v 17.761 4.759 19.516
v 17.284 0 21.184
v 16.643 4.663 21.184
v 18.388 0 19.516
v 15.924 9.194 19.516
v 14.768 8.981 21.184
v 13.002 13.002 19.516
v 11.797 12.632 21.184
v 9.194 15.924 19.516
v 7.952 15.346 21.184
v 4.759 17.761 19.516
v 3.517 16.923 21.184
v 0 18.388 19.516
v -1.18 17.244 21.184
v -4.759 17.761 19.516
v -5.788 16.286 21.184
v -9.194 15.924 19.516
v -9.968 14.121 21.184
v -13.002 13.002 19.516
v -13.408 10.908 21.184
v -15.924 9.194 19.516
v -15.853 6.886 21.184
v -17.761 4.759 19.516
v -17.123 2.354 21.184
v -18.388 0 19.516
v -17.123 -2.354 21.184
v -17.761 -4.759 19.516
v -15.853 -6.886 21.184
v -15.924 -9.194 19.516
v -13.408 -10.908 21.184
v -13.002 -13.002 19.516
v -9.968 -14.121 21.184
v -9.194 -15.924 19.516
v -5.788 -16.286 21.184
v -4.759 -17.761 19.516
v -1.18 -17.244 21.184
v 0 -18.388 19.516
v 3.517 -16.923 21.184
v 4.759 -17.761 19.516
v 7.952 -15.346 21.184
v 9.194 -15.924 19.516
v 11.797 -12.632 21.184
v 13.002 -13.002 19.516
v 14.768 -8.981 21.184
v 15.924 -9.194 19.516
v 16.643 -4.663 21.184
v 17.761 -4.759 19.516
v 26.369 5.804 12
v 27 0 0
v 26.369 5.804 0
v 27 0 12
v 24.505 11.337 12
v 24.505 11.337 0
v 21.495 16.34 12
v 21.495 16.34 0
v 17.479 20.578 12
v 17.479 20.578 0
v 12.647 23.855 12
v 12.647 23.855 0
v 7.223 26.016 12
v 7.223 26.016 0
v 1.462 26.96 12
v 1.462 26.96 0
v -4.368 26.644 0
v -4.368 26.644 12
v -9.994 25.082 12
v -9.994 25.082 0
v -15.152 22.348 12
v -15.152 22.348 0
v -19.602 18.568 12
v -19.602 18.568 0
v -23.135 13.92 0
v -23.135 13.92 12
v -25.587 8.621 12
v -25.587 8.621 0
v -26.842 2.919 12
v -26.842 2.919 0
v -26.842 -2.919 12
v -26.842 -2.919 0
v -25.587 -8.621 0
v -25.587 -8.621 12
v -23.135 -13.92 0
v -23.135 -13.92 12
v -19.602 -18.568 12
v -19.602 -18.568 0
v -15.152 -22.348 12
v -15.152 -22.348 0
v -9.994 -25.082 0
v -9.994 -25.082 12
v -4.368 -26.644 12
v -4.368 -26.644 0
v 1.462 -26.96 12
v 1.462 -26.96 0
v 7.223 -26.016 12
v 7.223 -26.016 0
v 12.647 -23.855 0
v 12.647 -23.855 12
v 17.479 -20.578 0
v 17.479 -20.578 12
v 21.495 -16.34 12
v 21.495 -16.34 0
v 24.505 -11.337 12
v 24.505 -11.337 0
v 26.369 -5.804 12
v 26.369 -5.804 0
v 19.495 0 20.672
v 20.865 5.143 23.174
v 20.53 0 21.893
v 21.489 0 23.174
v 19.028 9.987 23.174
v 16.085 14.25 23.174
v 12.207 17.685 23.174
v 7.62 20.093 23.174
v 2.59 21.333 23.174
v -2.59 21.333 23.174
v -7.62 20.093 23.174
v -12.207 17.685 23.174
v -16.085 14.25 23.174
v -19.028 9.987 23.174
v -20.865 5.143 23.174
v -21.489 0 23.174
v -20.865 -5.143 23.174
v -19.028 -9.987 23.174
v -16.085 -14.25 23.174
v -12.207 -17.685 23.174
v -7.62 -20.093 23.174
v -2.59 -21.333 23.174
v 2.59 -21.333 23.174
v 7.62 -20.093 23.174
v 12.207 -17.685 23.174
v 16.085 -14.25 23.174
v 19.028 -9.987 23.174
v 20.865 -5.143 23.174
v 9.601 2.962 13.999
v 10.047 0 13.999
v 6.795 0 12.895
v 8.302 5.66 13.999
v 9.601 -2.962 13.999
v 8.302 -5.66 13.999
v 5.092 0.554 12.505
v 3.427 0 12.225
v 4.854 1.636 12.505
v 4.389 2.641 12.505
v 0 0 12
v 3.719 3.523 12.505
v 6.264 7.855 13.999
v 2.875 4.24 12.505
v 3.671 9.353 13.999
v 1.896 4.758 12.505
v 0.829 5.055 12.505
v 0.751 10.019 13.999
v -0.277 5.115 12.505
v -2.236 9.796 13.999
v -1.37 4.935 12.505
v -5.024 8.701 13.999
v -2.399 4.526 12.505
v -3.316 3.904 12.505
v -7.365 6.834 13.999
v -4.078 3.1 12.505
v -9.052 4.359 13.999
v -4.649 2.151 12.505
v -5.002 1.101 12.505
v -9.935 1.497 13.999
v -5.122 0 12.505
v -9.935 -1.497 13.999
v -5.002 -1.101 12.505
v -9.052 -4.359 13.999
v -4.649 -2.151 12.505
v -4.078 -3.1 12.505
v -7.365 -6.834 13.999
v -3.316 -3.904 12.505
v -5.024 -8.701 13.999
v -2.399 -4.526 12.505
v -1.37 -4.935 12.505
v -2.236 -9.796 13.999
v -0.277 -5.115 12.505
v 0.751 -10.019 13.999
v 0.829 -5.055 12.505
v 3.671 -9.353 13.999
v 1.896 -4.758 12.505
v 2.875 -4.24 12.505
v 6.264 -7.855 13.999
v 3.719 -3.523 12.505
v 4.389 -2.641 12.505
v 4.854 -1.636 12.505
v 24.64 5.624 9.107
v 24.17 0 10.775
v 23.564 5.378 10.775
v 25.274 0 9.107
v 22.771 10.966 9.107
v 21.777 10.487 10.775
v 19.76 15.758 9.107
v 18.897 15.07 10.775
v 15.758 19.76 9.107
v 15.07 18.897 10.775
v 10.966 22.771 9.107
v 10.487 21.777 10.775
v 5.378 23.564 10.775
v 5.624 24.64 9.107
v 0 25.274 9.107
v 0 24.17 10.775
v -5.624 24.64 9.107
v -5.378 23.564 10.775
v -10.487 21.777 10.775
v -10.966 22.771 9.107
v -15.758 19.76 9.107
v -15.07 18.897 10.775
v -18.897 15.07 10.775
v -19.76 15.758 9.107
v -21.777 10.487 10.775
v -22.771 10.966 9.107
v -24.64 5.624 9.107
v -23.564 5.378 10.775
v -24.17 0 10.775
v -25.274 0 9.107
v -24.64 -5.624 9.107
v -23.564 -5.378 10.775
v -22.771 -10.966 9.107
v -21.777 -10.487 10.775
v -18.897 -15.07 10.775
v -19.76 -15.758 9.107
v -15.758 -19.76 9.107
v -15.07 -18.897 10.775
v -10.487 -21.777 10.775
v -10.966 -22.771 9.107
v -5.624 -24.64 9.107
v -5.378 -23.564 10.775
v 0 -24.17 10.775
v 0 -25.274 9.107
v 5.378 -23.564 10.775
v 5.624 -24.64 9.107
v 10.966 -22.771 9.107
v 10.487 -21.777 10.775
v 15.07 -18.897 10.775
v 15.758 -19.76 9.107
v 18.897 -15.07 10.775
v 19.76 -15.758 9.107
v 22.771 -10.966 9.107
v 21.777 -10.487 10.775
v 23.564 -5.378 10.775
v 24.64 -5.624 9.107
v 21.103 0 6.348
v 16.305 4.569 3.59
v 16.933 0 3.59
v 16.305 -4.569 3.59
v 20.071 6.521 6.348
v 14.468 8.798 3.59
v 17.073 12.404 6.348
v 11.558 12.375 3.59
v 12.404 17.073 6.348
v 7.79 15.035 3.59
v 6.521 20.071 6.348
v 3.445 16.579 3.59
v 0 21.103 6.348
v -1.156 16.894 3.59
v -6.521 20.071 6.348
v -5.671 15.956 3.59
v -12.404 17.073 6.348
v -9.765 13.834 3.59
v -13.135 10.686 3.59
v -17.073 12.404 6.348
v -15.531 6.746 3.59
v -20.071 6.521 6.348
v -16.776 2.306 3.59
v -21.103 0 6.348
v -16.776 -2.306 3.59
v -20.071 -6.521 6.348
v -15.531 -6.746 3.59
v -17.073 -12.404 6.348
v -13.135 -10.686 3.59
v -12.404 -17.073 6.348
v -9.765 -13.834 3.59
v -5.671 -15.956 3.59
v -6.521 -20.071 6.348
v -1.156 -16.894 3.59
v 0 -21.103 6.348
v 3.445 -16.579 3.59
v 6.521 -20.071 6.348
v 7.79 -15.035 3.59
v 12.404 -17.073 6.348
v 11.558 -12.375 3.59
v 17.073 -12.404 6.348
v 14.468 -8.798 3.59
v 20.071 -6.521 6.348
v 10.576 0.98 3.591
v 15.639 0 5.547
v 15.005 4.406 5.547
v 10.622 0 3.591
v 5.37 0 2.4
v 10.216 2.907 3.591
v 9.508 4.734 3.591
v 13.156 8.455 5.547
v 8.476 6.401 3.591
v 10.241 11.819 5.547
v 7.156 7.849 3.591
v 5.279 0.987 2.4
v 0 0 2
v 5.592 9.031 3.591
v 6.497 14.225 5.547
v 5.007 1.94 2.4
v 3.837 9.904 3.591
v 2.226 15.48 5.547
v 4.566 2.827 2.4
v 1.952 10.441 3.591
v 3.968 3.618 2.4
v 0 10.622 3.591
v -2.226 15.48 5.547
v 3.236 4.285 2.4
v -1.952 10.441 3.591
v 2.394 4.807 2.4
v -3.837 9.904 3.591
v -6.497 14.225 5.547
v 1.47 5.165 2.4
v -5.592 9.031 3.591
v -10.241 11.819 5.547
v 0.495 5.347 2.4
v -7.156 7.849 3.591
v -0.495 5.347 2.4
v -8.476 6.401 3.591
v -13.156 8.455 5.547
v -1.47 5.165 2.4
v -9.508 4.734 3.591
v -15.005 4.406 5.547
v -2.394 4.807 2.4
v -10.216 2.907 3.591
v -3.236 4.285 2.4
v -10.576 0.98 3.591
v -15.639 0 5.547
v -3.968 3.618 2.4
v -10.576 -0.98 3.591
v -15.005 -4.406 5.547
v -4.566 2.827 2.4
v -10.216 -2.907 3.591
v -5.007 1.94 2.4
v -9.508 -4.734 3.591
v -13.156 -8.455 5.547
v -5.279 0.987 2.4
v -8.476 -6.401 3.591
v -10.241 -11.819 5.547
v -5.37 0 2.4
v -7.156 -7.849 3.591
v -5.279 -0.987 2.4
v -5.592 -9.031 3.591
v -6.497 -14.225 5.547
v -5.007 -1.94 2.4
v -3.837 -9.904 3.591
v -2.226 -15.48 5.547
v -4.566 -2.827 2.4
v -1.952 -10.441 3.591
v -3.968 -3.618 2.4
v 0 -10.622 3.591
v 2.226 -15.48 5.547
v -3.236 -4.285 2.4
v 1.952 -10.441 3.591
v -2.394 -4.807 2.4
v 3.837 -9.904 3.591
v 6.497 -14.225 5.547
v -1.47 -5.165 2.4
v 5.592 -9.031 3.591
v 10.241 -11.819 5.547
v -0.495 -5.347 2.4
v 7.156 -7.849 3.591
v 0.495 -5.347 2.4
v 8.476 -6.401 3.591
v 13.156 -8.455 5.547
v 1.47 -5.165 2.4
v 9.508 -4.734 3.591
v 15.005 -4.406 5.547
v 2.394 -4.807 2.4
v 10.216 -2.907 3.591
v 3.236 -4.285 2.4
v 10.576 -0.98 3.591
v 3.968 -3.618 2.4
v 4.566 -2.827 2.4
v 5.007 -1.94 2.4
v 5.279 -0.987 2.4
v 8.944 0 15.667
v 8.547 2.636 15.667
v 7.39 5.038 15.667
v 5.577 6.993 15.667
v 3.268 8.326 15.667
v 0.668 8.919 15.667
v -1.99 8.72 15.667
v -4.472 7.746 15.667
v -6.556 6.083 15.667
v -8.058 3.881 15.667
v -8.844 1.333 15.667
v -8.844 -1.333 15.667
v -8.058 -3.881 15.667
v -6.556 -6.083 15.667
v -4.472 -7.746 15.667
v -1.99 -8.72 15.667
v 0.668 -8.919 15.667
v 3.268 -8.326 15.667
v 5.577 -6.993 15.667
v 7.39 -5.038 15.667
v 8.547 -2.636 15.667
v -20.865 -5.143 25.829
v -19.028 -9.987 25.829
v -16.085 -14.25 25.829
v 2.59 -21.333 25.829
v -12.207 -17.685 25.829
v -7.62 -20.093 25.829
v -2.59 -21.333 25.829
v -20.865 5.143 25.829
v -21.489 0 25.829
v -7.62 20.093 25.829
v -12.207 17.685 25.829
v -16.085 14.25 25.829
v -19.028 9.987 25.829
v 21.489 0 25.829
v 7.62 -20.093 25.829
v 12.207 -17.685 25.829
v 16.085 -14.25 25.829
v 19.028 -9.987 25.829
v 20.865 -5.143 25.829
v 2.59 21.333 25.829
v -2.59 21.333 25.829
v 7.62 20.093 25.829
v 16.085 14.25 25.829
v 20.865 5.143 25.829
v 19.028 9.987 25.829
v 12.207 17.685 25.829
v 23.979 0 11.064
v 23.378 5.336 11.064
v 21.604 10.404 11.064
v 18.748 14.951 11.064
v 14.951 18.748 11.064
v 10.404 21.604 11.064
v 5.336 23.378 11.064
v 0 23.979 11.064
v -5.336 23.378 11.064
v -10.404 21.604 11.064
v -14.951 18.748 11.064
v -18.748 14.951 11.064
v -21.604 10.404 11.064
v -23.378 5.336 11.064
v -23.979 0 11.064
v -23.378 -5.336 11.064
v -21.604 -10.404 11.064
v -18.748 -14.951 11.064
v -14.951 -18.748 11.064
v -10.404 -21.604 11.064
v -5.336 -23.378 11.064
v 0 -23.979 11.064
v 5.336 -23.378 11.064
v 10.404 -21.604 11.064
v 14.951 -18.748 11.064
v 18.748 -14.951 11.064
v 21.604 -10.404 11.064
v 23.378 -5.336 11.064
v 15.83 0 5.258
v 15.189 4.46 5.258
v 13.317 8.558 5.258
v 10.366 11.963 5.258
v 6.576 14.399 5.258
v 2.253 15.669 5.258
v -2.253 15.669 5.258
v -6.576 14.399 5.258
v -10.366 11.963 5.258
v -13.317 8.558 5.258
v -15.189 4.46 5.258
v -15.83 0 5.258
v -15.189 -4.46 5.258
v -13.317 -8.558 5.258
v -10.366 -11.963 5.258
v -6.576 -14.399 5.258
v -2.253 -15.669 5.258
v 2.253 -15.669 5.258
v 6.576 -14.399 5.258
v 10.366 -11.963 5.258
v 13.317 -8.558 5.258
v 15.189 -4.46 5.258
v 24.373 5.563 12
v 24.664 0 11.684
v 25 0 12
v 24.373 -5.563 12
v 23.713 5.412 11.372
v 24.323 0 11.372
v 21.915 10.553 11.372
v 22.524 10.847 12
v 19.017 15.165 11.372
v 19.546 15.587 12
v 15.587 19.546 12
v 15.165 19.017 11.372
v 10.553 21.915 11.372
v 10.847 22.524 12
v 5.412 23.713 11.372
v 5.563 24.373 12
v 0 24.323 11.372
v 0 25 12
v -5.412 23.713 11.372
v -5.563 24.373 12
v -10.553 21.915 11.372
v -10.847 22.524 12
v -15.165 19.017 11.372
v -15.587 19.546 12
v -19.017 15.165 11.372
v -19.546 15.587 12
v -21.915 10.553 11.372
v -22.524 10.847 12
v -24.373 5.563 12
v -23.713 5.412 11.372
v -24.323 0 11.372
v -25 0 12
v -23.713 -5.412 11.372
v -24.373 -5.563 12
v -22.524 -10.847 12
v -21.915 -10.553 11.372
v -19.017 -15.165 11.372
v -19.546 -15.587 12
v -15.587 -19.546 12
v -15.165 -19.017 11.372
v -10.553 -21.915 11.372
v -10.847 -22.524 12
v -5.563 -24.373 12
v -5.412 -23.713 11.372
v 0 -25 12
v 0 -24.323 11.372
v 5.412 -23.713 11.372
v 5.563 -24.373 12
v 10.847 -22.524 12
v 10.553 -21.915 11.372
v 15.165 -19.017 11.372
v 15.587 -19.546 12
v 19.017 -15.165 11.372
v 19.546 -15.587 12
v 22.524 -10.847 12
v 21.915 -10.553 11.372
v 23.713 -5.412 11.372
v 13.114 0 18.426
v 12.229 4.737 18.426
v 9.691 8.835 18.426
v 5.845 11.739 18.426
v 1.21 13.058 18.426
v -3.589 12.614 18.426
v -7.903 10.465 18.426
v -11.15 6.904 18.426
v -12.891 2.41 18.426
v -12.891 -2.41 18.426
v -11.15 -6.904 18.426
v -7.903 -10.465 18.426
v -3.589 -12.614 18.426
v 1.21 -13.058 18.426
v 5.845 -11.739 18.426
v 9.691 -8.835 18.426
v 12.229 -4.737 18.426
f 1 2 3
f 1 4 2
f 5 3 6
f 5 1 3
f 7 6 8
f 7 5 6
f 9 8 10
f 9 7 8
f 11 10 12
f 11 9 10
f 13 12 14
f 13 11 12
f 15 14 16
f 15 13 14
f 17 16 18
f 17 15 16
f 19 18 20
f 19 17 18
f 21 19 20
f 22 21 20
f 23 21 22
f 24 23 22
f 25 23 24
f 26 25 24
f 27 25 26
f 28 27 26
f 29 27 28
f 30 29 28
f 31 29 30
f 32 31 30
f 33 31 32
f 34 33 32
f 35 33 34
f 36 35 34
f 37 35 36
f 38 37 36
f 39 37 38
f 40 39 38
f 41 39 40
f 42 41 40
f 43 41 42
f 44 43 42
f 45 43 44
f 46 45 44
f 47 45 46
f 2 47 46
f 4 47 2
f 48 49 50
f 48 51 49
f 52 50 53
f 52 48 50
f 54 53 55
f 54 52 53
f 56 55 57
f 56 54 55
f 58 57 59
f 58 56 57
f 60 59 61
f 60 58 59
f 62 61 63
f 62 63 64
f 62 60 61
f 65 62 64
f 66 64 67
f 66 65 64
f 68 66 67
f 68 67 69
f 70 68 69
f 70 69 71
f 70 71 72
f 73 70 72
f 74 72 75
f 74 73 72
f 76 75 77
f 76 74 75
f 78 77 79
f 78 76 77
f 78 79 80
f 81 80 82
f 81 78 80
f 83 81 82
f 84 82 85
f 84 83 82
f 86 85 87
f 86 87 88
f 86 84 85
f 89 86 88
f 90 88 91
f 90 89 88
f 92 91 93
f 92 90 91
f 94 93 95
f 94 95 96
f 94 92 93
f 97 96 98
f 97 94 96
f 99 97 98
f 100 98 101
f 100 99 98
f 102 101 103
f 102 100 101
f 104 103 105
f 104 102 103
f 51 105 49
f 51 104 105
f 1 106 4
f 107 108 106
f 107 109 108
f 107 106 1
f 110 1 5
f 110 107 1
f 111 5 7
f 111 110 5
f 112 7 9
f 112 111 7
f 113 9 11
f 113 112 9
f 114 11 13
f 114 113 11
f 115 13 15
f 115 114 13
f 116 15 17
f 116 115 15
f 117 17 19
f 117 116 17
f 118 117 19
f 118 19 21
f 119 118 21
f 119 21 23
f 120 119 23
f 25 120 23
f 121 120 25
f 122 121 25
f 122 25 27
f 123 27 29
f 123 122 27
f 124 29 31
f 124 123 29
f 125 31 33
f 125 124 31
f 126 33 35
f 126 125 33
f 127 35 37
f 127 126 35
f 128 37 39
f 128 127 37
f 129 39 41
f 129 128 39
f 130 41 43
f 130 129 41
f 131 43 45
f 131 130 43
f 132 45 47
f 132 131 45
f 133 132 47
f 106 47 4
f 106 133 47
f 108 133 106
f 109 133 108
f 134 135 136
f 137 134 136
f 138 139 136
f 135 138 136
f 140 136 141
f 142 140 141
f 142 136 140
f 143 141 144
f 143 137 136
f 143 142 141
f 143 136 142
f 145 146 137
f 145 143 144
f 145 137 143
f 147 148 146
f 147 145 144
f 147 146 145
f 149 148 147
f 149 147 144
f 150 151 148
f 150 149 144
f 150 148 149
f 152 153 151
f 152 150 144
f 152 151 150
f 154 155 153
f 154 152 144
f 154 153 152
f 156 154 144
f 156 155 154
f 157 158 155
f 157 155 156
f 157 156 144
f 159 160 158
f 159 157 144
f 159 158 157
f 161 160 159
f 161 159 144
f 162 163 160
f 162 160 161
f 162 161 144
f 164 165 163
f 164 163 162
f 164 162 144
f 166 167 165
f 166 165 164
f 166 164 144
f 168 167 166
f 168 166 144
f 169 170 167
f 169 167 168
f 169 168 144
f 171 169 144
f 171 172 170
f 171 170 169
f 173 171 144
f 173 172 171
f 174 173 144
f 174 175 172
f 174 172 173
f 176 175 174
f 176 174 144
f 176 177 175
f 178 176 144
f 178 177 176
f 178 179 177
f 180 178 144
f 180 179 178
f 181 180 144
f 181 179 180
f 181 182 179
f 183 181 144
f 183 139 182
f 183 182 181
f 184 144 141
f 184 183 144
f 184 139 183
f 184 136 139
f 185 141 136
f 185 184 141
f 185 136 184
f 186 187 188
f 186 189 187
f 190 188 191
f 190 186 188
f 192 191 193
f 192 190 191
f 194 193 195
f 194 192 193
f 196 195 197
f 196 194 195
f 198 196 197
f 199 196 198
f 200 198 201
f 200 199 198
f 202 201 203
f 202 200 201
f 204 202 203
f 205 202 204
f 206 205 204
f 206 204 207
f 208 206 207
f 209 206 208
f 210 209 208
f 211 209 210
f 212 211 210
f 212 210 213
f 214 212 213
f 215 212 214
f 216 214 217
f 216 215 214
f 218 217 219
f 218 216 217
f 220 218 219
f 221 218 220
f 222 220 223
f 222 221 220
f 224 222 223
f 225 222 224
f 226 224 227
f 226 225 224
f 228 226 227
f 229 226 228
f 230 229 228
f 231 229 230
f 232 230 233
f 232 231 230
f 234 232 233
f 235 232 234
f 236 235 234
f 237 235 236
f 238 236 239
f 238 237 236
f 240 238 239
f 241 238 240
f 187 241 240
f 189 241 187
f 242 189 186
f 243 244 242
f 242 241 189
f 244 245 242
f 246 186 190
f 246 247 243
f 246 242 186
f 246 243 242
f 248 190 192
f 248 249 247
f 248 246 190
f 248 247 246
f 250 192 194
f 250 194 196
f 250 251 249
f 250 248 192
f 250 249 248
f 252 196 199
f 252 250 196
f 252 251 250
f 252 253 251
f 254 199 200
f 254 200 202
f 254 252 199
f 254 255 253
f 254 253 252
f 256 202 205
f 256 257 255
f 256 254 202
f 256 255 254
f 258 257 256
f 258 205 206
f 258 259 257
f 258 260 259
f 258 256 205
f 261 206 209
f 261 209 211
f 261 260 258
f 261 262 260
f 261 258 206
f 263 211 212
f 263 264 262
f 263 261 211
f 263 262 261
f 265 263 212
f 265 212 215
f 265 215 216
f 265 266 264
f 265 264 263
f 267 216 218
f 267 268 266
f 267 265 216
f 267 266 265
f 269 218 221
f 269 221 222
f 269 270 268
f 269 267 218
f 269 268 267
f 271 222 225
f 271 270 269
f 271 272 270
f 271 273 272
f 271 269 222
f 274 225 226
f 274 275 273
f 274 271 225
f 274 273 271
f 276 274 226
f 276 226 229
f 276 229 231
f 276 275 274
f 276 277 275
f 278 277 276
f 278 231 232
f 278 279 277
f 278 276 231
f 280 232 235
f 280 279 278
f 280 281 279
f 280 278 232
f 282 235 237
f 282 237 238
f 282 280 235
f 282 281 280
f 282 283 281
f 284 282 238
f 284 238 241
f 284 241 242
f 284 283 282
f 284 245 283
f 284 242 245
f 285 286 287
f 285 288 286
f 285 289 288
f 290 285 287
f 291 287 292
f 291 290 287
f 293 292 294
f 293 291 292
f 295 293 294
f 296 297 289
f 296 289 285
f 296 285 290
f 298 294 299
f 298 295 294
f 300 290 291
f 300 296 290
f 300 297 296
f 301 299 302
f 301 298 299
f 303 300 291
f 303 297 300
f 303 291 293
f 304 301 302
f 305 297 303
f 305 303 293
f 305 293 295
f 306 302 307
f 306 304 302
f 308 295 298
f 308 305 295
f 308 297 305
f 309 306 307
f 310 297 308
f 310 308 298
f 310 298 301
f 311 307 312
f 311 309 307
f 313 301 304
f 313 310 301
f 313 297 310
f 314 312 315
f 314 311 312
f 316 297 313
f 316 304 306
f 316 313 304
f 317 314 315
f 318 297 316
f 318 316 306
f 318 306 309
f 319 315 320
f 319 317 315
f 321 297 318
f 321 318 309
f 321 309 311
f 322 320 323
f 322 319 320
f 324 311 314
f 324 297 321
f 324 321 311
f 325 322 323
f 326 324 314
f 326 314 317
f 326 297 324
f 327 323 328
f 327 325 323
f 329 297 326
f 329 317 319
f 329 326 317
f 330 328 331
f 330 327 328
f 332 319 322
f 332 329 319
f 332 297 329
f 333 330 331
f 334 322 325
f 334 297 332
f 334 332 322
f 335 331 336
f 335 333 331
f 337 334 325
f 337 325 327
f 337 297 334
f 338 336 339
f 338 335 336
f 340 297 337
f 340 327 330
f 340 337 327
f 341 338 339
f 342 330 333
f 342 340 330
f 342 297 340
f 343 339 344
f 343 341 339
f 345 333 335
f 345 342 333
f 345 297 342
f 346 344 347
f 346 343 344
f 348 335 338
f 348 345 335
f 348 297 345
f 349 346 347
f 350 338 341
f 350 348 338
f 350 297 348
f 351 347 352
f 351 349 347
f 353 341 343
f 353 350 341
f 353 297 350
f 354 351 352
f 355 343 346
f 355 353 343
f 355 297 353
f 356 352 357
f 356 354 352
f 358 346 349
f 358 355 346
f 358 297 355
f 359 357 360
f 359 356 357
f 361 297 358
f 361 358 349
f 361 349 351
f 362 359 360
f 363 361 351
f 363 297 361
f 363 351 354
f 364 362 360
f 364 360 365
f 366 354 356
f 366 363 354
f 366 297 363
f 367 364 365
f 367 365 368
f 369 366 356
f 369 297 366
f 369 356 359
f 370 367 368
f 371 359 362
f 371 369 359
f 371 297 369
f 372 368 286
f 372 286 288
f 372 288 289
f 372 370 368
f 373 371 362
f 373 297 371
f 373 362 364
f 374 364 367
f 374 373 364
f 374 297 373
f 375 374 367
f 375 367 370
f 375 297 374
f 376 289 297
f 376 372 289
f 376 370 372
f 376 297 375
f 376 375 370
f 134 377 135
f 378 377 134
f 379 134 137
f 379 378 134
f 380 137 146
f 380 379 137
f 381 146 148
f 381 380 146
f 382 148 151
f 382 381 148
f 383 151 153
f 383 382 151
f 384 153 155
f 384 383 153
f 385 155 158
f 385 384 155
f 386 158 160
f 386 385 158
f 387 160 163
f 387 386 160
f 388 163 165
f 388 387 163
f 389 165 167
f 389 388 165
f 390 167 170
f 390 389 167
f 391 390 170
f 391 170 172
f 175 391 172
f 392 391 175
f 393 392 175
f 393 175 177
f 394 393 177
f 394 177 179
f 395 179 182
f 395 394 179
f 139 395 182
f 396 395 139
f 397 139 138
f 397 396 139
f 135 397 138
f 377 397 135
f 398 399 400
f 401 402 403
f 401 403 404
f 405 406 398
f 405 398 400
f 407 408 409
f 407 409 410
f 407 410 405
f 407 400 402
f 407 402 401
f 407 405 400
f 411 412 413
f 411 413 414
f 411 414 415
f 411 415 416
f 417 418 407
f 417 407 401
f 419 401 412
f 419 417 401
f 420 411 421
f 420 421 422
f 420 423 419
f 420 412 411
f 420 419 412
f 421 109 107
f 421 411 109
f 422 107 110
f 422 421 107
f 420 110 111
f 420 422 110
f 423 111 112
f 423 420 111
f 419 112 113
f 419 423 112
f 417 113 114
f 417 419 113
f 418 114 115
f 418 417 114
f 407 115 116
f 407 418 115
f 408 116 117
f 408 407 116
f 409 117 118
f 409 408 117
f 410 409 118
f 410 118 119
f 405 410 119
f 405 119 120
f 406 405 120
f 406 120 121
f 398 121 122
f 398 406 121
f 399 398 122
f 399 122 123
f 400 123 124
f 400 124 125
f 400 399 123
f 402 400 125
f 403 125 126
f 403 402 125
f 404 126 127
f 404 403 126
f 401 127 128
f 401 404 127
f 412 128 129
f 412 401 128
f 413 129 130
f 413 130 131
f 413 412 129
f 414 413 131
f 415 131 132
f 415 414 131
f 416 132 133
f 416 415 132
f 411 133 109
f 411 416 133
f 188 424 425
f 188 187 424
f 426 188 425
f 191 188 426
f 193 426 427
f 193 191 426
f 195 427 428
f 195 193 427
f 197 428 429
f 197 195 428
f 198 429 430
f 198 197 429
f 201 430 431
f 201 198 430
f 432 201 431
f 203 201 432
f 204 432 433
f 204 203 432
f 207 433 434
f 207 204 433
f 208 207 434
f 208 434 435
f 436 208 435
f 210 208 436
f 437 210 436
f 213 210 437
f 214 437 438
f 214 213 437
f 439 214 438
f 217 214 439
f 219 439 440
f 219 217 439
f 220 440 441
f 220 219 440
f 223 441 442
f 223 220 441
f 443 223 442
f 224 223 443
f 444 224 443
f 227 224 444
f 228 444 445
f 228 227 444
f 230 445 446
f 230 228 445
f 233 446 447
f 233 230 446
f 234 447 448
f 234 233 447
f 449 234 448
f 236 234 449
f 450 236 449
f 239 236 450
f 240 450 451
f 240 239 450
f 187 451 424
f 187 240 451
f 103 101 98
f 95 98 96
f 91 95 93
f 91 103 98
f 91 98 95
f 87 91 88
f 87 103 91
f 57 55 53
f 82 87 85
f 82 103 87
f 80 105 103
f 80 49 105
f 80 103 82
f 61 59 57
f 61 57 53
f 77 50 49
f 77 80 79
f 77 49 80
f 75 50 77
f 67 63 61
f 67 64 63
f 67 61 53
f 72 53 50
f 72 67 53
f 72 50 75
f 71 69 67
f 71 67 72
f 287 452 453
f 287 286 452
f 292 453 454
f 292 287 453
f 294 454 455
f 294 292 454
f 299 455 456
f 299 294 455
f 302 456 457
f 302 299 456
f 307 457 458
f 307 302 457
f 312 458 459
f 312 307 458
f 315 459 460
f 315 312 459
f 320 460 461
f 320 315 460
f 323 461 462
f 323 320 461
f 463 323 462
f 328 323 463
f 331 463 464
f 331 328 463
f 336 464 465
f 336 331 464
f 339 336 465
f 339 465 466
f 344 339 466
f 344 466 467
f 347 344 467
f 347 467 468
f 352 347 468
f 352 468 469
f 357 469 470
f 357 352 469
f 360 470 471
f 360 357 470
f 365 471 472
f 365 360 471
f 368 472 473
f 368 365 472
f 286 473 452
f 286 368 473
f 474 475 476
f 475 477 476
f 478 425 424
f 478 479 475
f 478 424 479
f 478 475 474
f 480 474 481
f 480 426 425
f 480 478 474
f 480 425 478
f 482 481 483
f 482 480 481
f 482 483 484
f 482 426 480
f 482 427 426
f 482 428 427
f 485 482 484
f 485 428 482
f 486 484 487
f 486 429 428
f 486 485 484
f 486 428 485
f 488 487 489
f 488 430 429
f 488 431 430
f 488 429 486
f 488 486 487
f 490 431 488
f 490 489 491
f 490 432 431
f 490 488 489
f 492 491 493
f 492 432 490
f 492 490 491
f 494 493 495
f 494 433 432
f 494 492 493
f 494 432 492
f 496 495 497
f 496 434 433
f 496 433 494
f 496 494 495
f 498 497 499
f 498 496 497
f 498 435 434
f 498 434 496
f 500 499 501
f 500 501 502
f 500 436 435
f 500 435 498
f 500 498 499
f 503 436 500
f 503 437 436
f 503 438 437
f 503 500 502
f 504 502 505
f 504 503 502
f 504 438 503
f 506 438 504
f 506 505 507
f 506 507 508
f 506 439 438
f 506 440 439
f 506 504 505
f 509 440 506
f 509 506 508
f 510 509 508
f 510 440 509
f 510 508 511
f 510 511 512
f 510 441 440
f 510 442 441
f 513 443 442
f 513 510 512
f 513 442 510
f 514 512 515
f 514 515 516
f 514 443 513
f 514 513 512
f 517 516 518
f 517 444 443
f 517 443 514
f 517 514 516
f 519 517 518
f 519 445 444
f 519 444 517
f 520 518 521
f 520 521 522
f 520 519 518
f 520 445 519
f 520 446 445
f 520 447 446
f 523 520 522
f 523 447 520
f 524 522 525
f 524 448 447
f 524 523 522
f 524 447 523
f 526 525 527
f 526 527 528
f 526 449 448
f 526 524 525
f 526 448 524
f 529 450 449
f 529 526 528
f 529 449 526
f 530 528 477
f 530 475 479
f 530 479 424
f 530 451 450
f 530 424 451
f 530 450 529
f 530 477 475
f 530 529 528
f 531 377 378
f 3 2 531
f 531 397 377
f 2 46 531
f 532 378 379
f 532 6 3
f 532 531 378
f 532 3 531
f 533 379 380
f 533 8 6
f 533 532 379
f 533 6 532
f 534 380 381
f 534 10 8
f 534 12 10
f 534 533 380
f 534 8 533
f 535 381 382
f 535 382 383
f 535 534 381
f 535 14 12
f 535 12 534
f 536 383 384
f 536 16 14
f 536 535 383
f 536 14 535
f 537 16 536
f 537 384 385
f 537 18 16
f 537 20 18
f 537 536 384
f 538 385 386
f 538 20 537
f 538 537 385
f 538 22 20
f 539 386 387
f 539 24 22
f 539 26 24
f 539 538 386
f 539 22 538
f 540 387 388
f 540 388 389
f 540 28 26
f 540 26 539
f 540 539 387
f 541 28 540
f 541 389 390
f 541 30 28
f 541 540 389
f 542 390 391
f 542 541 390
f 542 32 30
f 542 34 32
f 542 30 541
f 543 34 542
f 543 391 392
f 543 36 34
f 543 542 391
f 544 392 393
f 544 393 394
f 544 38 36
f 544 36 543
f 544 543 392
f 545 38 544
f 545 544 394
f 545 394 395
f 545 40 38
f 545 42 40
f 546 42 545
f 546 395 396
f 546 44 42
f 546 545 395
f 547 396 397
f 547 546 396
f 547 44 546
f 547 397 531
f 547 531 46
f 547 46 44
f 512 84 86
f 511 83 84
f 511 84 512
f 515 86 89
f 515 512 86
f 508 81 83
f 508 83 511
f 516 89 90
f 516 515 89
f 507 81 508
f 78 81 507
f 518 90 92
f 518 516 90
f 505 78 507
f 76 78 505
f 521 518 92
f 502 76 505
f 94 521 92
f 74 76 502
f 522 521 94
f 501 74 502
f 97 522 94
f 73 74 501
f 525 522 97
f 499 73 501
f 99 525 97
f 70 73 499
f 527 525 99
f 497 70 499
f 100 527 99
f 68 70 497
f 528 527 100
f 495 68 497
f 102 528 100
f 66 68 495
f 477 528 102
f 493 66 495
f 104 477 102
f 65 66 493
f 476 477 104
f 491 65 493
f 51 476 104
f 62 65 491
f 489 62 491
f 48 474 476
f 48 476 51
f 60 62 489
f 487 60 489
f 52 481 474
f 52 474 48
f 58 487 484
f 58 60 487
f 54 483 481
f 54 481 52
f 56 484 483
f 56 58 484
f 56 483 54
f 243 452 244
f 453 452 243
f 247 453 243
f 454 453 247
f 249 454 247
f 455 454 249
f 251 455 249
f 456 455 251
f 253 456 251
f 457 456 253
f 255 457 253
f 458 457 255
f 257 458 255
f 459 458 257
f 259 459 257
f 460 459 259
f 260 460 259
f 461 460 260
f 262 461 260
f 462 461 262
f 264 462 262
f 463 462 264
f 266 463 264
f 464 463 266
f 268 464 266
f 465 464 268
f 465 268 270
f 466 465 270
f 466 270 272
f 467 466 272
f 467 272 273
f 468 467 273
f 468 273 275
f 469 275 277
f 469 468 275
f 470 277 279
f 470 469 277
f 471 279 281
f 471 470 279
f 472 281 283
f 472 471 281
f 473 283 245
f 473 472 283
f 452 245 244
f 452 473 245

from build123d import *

# Parameters (mm, degrees)
F1_R     = 5
F2_DEPTH = 2


with BuildPart() as f2:
    # F1 (on Top) → F2 (new body)
    with BuildSketch(Plane.XY):
        Circle(F1_R)
    extrude(amount=F2_DEPTH)

    # F3 (on Front) → F4 (revolve)
    with BuildSketch(Plane.XZ):
        with BuildLine():
            Line((0, 2), (0, 0))
            Line((0, 0), (25, 0))
            Line((25, 0), (27, 0))
            Line((27, 0), (27, 12))
            Line((27, 12), (25, 12))
            ThreePointArc((25, 12), (24.4939551563, 11.5271883815), (23.9789700303, 11.064130577))
            Line((23.9789700303, 11.064130577), (24.1701333181, 10.7751541335))
            Line((24.1701333181, 10.7751541335), (25.2735815939, 9.1071008063))
            Line((25.2735815939, 9.1071008063), (16.9333149578, 3.589859427))
            Line((16.9333149578, 3.589859427), (15.8298666819, 5.2579127542))
            Line((15.8298666819, 5.2579127542), (15.6387033941, 5.5468891976))
            ThreePointArc((15.6387033941, 5.5468891976), (8.0179403033, 2.8978411792), (0, 2))
        make_face()
    revolve(axis=Axis((0, 0, 1), (0, 0, 1)))


with BuildPart() as f4:
    # F3 (on Front) → F4, piece 2 (revolve)
    with BuildSketch(Plane.XZ):
        with BuildLine():
            Line((0, 25.8287321776), (0, 12))
            ThreePointArc((0, 12), (5.1221996467, 12.5046009784), (10.0474722875, 13.9990041311))
            Line((10.0474722875, 13.9990041311), (8.9440240116, 15.6670574584))
            Line((8.9440240116, 15.6670574584), (17.2842906478, 21.1842988377))
            Line((17.2842906478, 21.1842988377), (18.3877389237, 19.5162455104))
            ThreePointArc((18.3877389237, 19.5162455104), (20.0222385673, 21.2743567793), (21.4892947103, 23.1744332494))
            Line((21.4892947103, 23.1744332494), (21.4892947103, 25.8287321776))
            Line((21.4892947103, 25.8287321776), (0, 25.8287321776))
        make_face()
    revolve(axis=Axis((0, 0, 1), (0, 0, 1)))


solid = Compound([f2.part, f4.part])
